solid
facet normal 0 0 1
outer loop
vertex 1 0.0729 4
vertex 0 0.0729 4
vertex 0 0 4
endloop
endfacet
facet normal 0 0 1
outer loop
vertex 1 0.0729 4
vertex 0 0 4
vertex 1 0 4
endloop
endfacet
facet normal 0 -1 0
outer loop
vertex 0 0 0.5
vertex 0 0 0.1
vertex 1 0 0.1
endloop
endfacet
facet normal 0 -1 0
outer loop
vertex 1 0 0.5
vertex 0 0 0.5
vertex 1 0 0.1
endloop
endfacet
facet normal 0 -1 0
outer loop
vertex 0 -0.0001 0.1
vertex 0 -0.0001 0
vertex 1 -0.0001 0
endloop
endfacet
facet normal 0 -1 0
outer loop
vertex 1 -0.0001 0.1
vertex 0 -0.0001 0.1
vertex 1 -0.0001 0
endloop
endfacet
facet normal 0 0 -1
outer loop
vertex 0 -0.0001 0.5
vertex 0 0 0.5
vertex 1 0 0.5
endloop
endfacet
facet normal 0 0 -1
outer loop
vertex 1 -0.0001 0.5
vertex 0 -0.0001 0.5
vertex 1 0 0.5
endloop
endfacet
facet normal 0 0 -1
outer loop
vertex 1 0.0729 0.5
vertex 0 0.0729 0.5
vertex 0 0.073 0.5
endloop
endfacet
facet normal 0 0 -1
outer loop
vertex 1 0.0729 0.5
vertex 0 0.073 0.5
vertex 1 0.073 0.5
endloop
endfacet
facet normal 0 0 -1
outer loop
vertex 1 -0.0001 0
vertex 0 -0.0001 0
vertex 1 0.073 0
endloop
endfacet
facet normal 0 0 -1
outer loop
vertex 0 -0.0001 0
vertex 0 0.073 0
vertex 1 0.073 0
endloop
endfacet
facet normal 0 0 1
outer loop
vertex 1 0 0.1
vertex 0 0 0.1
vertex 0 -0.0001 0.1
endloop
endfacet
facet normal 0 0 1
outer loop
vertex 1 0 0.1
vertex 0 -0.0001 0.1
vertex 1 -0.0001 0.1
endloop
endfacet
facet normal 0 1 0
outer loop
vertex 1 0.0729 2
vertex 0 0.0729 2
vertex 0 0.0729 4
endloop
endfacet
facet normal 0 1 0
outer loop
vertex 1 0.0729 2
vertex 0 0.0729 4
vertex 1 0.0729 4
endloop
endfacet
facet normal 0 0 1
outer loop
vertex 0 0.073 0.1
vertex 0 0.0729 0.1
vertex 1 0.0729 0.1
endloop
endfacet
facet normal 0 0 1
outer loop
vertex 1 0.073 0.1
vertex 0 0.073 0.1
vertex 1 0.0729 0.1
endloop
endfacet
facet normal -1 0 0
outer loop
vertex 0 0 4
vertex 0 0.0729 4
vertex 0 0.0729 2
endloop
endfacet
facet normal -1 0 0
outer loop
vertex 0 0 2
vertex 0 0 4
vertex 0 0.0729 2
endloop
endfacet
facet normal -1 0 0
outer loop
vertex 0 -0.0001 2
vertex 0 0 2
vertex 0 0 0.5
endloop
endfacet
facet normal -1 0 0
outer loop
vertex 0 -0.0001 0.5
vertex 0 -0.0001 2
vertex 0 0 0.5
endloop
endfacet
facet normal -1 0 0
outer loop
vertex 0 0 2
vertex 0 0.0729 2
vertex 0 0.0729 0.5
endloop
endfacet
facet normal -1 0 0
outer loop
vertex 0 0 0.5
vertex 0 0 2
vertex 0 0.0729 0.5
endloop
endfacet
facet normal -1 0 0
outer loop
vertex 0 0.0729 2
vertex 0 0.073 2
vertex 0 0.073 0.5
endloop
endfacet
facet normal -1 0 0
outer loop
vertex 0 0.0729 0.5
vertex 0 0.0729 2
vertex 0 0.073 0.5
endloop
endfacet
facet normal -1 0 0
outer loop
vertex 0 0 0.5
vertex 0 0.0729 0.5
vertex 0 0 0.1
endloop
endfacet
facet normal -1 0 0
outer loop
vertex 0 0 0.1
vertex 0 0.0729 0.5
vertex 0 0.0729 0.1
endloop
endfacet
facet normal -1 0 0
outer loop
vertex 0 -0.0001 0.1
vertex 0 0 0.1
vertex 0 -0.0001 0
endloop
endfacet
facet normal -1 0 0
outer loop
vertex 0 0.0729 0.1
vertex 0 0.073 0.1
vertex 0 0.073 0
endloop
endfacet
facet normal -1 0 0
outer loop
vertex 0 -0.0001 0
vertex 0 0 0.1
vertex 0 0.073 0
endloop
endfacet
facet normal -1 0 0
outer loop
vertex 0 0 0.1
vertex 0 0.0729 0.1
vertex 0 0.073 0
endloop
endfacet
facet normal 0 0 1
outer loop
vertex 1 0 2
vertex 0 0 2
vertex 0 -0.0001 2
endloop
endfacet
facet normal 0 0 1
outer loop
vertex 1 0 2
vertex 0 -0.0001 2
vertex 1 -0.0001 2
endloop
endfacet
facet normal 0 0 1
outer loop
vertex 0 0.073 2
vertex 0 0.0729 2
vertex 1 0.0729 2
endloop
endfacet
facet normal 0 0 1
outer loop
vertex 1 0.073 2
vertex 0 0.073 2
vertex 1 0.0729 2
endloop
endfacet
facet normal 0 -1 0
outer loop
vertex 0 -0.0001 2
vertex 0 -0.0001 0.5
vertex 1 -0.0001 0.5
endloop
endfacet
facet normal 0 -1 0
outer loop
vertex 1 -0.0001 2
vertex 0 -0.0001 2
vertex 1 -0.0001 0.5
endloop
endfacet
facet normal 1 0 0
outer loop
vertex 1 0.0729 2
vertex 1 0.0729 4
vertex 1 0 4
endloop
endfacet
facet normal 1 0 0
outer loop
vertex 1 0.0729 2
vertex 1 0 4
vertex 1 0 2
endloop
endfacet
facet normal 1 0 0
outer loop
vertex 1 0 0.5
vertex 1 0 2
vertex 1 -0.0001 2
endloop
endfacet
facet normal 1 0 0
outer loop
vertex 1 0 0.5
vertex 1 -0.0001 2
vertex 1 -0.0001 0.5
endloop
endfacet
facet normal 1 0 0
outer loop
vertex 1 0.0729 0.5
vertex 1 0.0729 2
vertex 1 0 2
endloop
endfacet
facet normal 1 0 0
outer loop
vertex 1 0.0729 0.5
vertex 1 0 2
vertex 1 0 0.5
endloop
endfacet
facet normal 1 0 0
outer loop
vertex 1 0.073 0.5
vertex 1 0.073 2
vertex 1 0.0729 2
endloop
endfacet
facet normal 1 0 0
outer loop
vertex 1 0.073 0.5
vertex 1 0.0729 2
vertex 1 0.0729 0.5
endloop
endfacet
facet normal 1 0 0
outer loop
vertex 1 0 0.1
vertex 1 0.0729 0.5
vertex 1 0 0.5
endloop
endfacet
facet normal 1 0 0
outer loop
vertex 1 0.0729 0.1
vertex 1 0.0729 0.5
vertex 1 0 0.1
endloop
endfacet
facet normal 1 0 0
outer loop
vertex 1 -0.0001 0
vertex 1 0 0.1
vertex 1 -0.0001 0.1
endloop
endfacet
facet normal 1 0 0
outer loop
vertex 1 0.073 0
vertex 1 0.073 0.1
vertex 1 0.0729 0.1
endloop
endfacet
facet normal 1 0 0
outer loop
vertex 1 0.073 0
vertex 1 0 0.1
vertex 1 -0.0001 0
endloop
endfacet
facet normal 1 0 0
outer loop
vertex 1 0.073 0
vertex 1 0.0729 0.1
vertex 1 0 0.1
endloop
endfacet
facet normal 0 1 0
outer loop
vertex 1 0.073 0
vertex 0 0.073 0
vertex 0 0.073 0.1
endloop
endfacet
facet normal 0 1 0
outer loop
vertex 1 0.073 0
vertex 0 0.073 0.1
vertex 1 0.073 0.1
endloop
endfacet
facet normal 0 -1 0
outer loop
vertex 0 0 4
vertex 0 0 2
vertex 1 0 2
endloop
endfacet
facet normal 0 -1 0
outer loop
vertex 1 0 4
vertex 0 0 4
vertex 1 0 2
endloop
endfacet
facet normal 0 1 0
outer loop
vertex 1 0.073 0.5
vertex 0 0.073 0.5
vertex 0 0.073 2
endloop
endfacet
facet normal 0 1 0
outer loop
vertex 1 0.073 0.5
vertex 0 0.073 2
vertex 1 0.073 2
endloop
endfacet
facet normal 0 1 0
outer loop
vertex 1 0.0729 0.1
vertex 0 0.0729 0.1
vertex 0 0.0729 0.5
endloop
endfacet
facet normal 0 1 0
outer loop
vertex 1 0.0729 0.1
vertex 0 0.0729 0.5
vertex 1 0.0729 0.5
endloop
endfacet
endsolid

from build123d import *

# Parameters (mm, degrees)
SKETCH1_W           = 1
SKETCH1_H           = 0.072865
BOSS_EXTRUDE1_DEPTH = 4
SKETCH7_W           = 1
SKETCH7_H           = 0.1
SKETCH7_H_2         = 1.5
BOSS_EXTRUDE6_DEPTH = 0.0001
BOSS_EXTRUDE7_START = -0.072865
SKETCH7_2_W         = 1
SKETCH7_2_H         = 0.1
SKETCH7_2_H_2       = 1.5
BOSS_EXTRUDE7_DEPTH = 0.0001


with BuildPart() as part:
    # Sketch1 → Boss-Extrude1 (new body)
    with BuildSketch(Plane.XY):
        with Locations((0.5, 0.0364325)):
            Rectangle(SKETCH1_W, SKETCH1_H)
    extrude(amount=BOSS_EXTRUDE1_DEPTH)

    # Sketch7 → Boss-Extrude6 (add)
    with BuildSketch(Plane(origin=(0, 0.072865, 0), x_dir=(1, 0, 0), z_dir=(0, 1, 0))):
        with Locations((0.5, -0.05)):
            Rectangle(SKETCH7_W, SKETCH7_H)
        with Locations((0.5, -1.25)):
            Rectangle(SKETCH7_W, SKETCH7_H_2)
    extrude(amount=BOSS_EXTRUDE6_DEPTH)

    # Sketch7<2> → Boss-Extrude7 (add)
    with BuildSketch(Plane(origin=(0, 0.072865, 0), x_dir=(1, 0, 0), z_dir=(0, 1, 0)).offset(BOSS_EXTRUDE7_START)):
        with Locations((0.5, -0.05)):
            Rectangle(SKETCH7_2_W, SKETCH7_2_H)
        with Locations((0.5, -1.25)):
            Rectangle(SKETCH7_2_W, SKETCH7_2_H_2)
    extrude(amount=-BOSS_EXTRUDE7_DEPTH)


solid = part.part
